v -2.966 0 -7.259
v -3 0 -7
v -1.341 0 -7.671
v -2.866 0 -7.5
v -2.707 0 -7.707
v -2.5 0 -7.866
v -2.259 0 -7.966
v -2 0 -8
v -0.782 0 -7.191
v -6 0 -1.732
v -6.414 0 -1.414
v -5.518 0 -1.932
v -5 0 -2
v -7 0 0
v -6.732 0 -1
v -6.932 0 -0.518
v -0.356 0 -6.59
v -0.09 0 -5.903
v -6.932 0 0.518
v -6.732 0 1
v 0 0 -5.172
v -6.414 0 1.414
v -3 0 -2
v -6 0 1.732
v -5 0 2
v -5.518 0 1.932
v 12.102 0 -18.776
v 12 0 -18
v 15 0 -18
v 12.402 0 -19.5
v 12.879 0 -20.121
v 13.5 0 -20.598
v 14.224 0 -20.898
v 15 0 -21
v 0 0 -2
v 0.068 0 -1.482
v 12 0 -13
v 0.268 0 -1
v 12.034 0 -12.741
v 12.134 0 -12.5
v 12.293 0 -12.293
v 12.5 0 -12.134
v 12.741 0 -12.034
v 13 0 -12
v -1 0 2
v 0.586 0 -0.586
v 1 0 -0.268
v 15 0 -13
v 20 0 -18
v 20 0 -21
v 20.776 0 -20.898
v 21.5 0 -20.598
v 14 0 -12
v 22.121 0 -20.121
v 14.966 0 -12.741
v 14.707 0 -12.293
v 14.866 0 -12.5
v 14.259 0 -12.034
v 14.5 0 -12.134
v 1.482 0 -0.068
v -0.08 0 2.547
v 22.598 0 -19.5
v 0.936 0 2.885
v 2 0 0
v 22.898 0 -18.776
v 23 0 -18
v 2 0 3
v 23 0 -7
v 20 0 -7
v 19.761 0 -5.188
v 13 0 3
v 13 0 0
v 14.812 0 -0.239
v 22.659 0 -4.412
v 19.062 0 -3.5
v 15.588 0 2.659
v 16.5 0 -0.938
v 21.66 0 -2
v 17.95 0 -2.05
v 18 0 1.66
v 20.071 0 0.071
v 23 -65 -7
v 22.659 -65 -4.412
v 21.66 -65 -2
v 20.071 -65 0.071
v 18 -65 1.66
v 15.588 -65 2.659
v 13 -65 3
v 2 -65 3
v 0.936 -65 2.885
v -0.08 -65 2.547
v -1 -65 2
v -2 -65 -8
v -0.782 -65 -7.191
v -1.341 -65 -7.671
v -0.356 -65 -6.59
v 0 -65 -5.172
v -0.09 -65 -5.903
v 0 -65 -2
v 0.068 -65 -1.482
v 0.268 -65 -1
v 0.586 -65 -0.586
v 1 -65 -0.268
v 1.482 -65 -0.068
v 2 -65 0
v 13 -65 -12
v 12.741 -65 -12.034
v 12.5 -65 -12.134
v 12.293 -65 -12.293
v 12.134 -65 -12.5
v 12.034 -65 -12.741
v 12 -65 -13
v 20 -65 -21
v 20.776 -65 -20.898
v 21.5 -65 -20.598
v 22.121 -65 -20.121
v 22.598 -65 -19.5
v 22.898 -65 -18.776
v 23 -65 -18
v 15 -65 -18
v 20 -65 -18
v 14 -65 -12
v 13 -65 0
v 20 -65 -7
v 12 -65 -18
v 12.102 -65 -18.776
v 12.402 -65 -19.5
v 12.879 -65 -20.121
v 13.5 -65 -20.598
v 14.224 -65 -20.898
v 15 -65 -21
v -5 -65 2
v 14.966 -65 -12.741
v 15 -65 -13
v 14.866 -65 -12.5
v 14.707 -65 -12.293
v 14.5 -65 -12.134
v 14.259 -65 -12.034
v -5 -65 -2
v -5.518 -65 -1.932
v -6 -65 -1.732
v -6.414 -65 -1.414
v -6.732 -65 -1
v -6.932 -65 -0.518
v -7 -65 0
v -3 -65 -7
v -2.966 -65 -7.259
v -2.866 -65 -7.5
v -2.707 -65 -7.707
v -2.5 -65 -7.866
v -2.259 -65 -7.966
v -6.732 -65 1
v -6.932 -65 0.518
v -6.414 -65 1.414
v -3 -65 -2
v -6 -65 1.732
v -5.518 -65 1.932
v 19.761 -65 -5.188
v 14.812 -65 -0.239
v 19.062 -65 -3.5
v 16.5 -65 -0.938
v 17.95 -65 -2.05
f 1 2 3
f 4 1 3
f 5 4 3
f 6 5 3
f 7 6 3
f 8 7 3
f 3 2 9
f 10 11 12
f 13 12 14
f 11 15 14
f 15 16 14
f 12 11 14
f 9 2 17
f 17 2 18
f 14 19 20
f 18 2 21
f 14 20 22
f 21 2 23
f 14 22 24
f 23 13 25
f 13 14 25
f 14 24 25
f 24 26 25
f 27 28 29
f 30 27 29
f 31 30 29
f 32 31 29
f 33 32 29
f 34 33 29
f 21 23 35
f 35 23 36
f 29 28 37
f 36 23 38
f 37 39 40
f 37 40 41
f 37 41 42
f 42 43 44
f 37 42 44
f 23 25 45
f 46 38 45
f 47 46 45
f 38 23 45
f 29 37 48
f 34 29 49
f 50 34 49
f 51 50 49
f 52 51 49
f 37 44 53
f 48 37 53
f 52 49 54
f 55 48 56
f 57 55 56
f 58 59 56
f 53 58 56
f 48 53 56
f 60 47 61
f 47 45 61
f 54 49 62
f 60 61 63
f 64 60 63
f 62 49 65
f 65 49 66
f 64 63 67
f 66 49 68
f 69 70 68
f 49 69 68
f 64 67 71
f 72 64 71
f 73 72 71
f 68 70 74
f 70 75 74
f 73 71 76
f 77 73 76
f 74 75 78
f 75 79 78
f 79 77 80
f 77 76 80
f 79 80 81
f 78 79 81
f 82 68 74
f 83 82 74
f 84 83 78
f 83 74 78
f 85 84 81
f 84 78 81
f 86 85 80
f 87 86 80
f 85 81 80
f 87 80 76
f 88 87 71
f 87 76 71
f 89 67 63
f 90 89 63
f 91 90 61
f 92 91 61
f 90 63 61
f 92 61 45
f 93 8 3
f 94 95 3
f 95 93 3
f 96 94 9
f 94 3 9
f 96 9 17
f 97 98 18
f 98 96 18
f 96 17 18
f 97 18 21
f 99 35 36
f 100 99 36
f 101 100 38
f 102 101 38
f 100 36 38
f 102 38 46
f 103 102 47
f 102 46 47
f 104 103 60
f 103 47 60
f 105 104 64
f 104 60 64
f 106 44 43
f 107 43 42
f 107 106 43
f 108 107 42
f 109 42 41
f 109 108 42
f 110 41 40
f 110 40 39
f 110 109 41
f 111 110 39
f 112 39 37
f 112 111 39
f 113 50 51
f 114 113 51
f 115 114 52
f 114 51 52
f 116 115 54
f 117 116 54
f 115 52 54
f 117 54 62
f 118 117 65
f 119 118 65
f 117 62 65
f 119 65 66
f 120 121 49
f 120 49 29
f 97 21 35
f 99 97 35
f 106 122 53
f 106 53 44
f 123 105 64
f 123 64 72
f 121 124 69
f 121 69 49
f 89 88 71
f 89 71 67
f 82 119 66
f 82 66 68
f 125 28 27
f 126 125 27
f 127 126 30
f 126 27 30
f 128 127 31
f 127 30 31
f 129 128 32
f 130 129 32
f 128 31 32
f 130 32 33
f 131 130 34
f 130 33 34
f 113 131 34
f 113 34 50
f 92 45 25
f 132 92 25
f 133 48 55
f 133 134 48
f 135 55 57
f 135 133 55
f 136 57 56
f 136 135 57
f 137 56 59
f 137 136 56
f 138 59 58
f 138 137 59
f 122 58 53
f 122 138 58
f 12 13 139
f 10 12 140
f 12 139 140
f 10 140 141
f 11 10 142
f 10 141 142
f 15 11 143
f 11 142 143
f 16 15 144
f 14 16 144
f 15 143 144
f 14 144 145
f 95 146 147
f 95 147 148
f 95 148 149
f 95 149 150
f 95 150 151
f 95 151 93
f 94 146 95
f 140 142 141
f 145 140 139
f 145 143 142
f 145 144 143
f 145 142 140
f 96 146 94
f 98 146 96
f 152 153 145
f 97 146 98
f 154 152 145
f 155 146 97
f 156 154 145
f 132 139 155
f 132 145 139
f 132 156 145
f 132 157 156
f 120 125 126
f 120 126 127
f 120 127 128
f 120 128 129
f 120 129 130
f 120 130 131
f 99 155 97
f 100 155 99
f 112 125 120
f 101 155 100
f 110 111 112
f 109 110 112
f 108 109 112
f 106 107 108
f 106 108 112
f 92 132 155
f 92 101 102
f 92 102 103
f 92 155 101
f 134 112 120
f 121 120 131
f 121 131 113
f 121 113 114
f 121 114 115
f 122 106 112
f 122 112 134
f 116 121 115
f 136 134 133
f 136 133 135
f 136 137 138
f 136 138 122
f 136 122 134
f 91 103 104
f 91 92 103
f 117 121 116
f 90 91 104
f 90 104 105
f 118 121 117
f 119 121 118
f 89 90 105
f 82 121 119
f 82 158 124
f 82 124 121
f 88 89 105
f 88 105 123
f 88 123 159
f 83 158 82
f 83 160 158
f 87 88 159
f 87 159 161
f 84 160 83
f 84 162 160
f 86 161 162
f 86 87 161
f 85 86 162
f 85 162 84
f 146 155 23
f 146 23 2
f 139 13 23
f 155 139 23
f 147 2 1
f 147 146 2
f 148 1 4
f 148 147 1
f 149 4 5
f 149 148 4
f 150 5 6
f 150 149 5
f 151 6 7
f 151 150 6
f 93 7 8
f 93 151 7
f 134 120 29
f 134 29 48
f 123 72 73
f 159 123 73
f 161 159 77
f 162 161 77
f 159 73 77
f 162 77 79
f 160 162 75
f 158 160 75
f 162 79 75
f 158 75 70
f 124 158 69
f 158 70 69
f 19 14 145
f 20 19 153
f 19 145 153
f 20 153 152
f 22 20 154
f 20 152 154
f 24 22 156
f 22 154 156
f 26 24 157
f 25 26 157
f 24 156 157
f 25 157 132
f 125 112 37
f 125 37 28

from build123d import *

# Parameters (mm, degrees)
F1_DEPTH    = 65
F2_R        = 1
F3_R        = 1.99999
F4_T1_DEPTH = 79.1421356237


# Not quite as in the source:
# - a fillet or chamfer that OpenCascade refuses, or shapes differently, is made with other operations: its cross-section is extruded or revolved along the edge and cut away or added
# - a fillet or chamfer is up to 0.001 mm smaller than in the source, because OpenCascade refuses the exact size
# - a feature names something its author has since deleted; it is built from what else it names


with BuildPart() as f1:
    # F0 (on Front) → F1 (new body)
    with BuildSketch(Plane.XZ):
        with BuildLine():
            ThreePointArc((0, -2), (0.5857864376, -0.5857864376), (2, 0))
            Line((2, 0), (13, 0))
            ThreePointArc((13, 0), (17.9497474683, -2.0502525317), (20, -7))
            Line((20, -7), (20, -18))
            Line((20, -18), (15, -18))
            Line((15, -18), (15, -12))
            Line((15, -12), (12, -12))
            Line((12, -12), (12, -18))
            ThreePointArc((12, -18), (12.8786796564, -20.1213203436), (15, -21))
            Line((15, -21), (20, -21))
            ThreePointArc((20, -21), (22.1213203436, -20.1213203436), (23, -18))
            Line((23, -18), (23, -7))
            ThreePointArc((23, -7), (20.0710678119, 0.0710678119), (13, 3))
            Line((13, 3), (2, 3))
            ThreePointArc((2, 3), (0.4188611699, 2.7434164903), (-1, 2))
            ThreePointArc((-1, 2), (-2.472135955, 0.2360679775), (-3, -2))
            Line((-3, -2), (-3, -8))
            Line((-3, -8), (0, -8))
            Line((0, -8), (0, -2))
        make_face()
        with BuildLine():
            Line((-7, -2), (-3, -2))
            ThreePointArc((-3, -2), (-2.472135955, 0.2360679775), (-1, 2))
            Line((-1, 2), (-7, 2))
            Line((-7, 2), (-7, -2))
        make_face()
    extrude(amount=F1_DEPTH)

    # F2
    f2_edges = [f1.edges().sort_by_distance(p)[0] for p in [
        (-3, -32.5, -8),
        (12, -32.5, -12),
        (15, -32.5, -12),
    ]]
    fillet(f2_edges, radius=F2_R)

    # F3 (radius 2 in the source; OpenCascade refuses exactly that, so slightly less here)
    f3_edges = [f1.edges().sort_by_distance(p)[0] for p in [
        (-7, -32.5, -2),
        (-7, -32.5, 2),
    ]]
    fillet(f3_edges, radius=F3_R)

    # F4: fillet of radius 3 on 1 edges, made by hand

    # F4_s2 → F4_t1 (cut)
    with BuildSketch(Plane.XZ.offset(-7.0710678119)):
        with BuildLine():
            ThreePointArc((-2, -8), (-0.5505102572, -6.9036236828), (0, -5.1715728753))
            Line((0, -5.1715728753), (0.06, -5.1715728753))
            Line((0.06, -5.1715728753), (0.06, -8))
            Line((0.06, -8), (0, -8.06))
            ThreePointArc((0, -8.06), (-1, -8.06), (-1.98, -8.0565685425))
            Line((-1.98, -8.0565685425), (-2, -8))
        make_face()
    extrude(amount=F4_T1_DEPTH, mode=Mode.SUBTRACT)


solid = f1.part
